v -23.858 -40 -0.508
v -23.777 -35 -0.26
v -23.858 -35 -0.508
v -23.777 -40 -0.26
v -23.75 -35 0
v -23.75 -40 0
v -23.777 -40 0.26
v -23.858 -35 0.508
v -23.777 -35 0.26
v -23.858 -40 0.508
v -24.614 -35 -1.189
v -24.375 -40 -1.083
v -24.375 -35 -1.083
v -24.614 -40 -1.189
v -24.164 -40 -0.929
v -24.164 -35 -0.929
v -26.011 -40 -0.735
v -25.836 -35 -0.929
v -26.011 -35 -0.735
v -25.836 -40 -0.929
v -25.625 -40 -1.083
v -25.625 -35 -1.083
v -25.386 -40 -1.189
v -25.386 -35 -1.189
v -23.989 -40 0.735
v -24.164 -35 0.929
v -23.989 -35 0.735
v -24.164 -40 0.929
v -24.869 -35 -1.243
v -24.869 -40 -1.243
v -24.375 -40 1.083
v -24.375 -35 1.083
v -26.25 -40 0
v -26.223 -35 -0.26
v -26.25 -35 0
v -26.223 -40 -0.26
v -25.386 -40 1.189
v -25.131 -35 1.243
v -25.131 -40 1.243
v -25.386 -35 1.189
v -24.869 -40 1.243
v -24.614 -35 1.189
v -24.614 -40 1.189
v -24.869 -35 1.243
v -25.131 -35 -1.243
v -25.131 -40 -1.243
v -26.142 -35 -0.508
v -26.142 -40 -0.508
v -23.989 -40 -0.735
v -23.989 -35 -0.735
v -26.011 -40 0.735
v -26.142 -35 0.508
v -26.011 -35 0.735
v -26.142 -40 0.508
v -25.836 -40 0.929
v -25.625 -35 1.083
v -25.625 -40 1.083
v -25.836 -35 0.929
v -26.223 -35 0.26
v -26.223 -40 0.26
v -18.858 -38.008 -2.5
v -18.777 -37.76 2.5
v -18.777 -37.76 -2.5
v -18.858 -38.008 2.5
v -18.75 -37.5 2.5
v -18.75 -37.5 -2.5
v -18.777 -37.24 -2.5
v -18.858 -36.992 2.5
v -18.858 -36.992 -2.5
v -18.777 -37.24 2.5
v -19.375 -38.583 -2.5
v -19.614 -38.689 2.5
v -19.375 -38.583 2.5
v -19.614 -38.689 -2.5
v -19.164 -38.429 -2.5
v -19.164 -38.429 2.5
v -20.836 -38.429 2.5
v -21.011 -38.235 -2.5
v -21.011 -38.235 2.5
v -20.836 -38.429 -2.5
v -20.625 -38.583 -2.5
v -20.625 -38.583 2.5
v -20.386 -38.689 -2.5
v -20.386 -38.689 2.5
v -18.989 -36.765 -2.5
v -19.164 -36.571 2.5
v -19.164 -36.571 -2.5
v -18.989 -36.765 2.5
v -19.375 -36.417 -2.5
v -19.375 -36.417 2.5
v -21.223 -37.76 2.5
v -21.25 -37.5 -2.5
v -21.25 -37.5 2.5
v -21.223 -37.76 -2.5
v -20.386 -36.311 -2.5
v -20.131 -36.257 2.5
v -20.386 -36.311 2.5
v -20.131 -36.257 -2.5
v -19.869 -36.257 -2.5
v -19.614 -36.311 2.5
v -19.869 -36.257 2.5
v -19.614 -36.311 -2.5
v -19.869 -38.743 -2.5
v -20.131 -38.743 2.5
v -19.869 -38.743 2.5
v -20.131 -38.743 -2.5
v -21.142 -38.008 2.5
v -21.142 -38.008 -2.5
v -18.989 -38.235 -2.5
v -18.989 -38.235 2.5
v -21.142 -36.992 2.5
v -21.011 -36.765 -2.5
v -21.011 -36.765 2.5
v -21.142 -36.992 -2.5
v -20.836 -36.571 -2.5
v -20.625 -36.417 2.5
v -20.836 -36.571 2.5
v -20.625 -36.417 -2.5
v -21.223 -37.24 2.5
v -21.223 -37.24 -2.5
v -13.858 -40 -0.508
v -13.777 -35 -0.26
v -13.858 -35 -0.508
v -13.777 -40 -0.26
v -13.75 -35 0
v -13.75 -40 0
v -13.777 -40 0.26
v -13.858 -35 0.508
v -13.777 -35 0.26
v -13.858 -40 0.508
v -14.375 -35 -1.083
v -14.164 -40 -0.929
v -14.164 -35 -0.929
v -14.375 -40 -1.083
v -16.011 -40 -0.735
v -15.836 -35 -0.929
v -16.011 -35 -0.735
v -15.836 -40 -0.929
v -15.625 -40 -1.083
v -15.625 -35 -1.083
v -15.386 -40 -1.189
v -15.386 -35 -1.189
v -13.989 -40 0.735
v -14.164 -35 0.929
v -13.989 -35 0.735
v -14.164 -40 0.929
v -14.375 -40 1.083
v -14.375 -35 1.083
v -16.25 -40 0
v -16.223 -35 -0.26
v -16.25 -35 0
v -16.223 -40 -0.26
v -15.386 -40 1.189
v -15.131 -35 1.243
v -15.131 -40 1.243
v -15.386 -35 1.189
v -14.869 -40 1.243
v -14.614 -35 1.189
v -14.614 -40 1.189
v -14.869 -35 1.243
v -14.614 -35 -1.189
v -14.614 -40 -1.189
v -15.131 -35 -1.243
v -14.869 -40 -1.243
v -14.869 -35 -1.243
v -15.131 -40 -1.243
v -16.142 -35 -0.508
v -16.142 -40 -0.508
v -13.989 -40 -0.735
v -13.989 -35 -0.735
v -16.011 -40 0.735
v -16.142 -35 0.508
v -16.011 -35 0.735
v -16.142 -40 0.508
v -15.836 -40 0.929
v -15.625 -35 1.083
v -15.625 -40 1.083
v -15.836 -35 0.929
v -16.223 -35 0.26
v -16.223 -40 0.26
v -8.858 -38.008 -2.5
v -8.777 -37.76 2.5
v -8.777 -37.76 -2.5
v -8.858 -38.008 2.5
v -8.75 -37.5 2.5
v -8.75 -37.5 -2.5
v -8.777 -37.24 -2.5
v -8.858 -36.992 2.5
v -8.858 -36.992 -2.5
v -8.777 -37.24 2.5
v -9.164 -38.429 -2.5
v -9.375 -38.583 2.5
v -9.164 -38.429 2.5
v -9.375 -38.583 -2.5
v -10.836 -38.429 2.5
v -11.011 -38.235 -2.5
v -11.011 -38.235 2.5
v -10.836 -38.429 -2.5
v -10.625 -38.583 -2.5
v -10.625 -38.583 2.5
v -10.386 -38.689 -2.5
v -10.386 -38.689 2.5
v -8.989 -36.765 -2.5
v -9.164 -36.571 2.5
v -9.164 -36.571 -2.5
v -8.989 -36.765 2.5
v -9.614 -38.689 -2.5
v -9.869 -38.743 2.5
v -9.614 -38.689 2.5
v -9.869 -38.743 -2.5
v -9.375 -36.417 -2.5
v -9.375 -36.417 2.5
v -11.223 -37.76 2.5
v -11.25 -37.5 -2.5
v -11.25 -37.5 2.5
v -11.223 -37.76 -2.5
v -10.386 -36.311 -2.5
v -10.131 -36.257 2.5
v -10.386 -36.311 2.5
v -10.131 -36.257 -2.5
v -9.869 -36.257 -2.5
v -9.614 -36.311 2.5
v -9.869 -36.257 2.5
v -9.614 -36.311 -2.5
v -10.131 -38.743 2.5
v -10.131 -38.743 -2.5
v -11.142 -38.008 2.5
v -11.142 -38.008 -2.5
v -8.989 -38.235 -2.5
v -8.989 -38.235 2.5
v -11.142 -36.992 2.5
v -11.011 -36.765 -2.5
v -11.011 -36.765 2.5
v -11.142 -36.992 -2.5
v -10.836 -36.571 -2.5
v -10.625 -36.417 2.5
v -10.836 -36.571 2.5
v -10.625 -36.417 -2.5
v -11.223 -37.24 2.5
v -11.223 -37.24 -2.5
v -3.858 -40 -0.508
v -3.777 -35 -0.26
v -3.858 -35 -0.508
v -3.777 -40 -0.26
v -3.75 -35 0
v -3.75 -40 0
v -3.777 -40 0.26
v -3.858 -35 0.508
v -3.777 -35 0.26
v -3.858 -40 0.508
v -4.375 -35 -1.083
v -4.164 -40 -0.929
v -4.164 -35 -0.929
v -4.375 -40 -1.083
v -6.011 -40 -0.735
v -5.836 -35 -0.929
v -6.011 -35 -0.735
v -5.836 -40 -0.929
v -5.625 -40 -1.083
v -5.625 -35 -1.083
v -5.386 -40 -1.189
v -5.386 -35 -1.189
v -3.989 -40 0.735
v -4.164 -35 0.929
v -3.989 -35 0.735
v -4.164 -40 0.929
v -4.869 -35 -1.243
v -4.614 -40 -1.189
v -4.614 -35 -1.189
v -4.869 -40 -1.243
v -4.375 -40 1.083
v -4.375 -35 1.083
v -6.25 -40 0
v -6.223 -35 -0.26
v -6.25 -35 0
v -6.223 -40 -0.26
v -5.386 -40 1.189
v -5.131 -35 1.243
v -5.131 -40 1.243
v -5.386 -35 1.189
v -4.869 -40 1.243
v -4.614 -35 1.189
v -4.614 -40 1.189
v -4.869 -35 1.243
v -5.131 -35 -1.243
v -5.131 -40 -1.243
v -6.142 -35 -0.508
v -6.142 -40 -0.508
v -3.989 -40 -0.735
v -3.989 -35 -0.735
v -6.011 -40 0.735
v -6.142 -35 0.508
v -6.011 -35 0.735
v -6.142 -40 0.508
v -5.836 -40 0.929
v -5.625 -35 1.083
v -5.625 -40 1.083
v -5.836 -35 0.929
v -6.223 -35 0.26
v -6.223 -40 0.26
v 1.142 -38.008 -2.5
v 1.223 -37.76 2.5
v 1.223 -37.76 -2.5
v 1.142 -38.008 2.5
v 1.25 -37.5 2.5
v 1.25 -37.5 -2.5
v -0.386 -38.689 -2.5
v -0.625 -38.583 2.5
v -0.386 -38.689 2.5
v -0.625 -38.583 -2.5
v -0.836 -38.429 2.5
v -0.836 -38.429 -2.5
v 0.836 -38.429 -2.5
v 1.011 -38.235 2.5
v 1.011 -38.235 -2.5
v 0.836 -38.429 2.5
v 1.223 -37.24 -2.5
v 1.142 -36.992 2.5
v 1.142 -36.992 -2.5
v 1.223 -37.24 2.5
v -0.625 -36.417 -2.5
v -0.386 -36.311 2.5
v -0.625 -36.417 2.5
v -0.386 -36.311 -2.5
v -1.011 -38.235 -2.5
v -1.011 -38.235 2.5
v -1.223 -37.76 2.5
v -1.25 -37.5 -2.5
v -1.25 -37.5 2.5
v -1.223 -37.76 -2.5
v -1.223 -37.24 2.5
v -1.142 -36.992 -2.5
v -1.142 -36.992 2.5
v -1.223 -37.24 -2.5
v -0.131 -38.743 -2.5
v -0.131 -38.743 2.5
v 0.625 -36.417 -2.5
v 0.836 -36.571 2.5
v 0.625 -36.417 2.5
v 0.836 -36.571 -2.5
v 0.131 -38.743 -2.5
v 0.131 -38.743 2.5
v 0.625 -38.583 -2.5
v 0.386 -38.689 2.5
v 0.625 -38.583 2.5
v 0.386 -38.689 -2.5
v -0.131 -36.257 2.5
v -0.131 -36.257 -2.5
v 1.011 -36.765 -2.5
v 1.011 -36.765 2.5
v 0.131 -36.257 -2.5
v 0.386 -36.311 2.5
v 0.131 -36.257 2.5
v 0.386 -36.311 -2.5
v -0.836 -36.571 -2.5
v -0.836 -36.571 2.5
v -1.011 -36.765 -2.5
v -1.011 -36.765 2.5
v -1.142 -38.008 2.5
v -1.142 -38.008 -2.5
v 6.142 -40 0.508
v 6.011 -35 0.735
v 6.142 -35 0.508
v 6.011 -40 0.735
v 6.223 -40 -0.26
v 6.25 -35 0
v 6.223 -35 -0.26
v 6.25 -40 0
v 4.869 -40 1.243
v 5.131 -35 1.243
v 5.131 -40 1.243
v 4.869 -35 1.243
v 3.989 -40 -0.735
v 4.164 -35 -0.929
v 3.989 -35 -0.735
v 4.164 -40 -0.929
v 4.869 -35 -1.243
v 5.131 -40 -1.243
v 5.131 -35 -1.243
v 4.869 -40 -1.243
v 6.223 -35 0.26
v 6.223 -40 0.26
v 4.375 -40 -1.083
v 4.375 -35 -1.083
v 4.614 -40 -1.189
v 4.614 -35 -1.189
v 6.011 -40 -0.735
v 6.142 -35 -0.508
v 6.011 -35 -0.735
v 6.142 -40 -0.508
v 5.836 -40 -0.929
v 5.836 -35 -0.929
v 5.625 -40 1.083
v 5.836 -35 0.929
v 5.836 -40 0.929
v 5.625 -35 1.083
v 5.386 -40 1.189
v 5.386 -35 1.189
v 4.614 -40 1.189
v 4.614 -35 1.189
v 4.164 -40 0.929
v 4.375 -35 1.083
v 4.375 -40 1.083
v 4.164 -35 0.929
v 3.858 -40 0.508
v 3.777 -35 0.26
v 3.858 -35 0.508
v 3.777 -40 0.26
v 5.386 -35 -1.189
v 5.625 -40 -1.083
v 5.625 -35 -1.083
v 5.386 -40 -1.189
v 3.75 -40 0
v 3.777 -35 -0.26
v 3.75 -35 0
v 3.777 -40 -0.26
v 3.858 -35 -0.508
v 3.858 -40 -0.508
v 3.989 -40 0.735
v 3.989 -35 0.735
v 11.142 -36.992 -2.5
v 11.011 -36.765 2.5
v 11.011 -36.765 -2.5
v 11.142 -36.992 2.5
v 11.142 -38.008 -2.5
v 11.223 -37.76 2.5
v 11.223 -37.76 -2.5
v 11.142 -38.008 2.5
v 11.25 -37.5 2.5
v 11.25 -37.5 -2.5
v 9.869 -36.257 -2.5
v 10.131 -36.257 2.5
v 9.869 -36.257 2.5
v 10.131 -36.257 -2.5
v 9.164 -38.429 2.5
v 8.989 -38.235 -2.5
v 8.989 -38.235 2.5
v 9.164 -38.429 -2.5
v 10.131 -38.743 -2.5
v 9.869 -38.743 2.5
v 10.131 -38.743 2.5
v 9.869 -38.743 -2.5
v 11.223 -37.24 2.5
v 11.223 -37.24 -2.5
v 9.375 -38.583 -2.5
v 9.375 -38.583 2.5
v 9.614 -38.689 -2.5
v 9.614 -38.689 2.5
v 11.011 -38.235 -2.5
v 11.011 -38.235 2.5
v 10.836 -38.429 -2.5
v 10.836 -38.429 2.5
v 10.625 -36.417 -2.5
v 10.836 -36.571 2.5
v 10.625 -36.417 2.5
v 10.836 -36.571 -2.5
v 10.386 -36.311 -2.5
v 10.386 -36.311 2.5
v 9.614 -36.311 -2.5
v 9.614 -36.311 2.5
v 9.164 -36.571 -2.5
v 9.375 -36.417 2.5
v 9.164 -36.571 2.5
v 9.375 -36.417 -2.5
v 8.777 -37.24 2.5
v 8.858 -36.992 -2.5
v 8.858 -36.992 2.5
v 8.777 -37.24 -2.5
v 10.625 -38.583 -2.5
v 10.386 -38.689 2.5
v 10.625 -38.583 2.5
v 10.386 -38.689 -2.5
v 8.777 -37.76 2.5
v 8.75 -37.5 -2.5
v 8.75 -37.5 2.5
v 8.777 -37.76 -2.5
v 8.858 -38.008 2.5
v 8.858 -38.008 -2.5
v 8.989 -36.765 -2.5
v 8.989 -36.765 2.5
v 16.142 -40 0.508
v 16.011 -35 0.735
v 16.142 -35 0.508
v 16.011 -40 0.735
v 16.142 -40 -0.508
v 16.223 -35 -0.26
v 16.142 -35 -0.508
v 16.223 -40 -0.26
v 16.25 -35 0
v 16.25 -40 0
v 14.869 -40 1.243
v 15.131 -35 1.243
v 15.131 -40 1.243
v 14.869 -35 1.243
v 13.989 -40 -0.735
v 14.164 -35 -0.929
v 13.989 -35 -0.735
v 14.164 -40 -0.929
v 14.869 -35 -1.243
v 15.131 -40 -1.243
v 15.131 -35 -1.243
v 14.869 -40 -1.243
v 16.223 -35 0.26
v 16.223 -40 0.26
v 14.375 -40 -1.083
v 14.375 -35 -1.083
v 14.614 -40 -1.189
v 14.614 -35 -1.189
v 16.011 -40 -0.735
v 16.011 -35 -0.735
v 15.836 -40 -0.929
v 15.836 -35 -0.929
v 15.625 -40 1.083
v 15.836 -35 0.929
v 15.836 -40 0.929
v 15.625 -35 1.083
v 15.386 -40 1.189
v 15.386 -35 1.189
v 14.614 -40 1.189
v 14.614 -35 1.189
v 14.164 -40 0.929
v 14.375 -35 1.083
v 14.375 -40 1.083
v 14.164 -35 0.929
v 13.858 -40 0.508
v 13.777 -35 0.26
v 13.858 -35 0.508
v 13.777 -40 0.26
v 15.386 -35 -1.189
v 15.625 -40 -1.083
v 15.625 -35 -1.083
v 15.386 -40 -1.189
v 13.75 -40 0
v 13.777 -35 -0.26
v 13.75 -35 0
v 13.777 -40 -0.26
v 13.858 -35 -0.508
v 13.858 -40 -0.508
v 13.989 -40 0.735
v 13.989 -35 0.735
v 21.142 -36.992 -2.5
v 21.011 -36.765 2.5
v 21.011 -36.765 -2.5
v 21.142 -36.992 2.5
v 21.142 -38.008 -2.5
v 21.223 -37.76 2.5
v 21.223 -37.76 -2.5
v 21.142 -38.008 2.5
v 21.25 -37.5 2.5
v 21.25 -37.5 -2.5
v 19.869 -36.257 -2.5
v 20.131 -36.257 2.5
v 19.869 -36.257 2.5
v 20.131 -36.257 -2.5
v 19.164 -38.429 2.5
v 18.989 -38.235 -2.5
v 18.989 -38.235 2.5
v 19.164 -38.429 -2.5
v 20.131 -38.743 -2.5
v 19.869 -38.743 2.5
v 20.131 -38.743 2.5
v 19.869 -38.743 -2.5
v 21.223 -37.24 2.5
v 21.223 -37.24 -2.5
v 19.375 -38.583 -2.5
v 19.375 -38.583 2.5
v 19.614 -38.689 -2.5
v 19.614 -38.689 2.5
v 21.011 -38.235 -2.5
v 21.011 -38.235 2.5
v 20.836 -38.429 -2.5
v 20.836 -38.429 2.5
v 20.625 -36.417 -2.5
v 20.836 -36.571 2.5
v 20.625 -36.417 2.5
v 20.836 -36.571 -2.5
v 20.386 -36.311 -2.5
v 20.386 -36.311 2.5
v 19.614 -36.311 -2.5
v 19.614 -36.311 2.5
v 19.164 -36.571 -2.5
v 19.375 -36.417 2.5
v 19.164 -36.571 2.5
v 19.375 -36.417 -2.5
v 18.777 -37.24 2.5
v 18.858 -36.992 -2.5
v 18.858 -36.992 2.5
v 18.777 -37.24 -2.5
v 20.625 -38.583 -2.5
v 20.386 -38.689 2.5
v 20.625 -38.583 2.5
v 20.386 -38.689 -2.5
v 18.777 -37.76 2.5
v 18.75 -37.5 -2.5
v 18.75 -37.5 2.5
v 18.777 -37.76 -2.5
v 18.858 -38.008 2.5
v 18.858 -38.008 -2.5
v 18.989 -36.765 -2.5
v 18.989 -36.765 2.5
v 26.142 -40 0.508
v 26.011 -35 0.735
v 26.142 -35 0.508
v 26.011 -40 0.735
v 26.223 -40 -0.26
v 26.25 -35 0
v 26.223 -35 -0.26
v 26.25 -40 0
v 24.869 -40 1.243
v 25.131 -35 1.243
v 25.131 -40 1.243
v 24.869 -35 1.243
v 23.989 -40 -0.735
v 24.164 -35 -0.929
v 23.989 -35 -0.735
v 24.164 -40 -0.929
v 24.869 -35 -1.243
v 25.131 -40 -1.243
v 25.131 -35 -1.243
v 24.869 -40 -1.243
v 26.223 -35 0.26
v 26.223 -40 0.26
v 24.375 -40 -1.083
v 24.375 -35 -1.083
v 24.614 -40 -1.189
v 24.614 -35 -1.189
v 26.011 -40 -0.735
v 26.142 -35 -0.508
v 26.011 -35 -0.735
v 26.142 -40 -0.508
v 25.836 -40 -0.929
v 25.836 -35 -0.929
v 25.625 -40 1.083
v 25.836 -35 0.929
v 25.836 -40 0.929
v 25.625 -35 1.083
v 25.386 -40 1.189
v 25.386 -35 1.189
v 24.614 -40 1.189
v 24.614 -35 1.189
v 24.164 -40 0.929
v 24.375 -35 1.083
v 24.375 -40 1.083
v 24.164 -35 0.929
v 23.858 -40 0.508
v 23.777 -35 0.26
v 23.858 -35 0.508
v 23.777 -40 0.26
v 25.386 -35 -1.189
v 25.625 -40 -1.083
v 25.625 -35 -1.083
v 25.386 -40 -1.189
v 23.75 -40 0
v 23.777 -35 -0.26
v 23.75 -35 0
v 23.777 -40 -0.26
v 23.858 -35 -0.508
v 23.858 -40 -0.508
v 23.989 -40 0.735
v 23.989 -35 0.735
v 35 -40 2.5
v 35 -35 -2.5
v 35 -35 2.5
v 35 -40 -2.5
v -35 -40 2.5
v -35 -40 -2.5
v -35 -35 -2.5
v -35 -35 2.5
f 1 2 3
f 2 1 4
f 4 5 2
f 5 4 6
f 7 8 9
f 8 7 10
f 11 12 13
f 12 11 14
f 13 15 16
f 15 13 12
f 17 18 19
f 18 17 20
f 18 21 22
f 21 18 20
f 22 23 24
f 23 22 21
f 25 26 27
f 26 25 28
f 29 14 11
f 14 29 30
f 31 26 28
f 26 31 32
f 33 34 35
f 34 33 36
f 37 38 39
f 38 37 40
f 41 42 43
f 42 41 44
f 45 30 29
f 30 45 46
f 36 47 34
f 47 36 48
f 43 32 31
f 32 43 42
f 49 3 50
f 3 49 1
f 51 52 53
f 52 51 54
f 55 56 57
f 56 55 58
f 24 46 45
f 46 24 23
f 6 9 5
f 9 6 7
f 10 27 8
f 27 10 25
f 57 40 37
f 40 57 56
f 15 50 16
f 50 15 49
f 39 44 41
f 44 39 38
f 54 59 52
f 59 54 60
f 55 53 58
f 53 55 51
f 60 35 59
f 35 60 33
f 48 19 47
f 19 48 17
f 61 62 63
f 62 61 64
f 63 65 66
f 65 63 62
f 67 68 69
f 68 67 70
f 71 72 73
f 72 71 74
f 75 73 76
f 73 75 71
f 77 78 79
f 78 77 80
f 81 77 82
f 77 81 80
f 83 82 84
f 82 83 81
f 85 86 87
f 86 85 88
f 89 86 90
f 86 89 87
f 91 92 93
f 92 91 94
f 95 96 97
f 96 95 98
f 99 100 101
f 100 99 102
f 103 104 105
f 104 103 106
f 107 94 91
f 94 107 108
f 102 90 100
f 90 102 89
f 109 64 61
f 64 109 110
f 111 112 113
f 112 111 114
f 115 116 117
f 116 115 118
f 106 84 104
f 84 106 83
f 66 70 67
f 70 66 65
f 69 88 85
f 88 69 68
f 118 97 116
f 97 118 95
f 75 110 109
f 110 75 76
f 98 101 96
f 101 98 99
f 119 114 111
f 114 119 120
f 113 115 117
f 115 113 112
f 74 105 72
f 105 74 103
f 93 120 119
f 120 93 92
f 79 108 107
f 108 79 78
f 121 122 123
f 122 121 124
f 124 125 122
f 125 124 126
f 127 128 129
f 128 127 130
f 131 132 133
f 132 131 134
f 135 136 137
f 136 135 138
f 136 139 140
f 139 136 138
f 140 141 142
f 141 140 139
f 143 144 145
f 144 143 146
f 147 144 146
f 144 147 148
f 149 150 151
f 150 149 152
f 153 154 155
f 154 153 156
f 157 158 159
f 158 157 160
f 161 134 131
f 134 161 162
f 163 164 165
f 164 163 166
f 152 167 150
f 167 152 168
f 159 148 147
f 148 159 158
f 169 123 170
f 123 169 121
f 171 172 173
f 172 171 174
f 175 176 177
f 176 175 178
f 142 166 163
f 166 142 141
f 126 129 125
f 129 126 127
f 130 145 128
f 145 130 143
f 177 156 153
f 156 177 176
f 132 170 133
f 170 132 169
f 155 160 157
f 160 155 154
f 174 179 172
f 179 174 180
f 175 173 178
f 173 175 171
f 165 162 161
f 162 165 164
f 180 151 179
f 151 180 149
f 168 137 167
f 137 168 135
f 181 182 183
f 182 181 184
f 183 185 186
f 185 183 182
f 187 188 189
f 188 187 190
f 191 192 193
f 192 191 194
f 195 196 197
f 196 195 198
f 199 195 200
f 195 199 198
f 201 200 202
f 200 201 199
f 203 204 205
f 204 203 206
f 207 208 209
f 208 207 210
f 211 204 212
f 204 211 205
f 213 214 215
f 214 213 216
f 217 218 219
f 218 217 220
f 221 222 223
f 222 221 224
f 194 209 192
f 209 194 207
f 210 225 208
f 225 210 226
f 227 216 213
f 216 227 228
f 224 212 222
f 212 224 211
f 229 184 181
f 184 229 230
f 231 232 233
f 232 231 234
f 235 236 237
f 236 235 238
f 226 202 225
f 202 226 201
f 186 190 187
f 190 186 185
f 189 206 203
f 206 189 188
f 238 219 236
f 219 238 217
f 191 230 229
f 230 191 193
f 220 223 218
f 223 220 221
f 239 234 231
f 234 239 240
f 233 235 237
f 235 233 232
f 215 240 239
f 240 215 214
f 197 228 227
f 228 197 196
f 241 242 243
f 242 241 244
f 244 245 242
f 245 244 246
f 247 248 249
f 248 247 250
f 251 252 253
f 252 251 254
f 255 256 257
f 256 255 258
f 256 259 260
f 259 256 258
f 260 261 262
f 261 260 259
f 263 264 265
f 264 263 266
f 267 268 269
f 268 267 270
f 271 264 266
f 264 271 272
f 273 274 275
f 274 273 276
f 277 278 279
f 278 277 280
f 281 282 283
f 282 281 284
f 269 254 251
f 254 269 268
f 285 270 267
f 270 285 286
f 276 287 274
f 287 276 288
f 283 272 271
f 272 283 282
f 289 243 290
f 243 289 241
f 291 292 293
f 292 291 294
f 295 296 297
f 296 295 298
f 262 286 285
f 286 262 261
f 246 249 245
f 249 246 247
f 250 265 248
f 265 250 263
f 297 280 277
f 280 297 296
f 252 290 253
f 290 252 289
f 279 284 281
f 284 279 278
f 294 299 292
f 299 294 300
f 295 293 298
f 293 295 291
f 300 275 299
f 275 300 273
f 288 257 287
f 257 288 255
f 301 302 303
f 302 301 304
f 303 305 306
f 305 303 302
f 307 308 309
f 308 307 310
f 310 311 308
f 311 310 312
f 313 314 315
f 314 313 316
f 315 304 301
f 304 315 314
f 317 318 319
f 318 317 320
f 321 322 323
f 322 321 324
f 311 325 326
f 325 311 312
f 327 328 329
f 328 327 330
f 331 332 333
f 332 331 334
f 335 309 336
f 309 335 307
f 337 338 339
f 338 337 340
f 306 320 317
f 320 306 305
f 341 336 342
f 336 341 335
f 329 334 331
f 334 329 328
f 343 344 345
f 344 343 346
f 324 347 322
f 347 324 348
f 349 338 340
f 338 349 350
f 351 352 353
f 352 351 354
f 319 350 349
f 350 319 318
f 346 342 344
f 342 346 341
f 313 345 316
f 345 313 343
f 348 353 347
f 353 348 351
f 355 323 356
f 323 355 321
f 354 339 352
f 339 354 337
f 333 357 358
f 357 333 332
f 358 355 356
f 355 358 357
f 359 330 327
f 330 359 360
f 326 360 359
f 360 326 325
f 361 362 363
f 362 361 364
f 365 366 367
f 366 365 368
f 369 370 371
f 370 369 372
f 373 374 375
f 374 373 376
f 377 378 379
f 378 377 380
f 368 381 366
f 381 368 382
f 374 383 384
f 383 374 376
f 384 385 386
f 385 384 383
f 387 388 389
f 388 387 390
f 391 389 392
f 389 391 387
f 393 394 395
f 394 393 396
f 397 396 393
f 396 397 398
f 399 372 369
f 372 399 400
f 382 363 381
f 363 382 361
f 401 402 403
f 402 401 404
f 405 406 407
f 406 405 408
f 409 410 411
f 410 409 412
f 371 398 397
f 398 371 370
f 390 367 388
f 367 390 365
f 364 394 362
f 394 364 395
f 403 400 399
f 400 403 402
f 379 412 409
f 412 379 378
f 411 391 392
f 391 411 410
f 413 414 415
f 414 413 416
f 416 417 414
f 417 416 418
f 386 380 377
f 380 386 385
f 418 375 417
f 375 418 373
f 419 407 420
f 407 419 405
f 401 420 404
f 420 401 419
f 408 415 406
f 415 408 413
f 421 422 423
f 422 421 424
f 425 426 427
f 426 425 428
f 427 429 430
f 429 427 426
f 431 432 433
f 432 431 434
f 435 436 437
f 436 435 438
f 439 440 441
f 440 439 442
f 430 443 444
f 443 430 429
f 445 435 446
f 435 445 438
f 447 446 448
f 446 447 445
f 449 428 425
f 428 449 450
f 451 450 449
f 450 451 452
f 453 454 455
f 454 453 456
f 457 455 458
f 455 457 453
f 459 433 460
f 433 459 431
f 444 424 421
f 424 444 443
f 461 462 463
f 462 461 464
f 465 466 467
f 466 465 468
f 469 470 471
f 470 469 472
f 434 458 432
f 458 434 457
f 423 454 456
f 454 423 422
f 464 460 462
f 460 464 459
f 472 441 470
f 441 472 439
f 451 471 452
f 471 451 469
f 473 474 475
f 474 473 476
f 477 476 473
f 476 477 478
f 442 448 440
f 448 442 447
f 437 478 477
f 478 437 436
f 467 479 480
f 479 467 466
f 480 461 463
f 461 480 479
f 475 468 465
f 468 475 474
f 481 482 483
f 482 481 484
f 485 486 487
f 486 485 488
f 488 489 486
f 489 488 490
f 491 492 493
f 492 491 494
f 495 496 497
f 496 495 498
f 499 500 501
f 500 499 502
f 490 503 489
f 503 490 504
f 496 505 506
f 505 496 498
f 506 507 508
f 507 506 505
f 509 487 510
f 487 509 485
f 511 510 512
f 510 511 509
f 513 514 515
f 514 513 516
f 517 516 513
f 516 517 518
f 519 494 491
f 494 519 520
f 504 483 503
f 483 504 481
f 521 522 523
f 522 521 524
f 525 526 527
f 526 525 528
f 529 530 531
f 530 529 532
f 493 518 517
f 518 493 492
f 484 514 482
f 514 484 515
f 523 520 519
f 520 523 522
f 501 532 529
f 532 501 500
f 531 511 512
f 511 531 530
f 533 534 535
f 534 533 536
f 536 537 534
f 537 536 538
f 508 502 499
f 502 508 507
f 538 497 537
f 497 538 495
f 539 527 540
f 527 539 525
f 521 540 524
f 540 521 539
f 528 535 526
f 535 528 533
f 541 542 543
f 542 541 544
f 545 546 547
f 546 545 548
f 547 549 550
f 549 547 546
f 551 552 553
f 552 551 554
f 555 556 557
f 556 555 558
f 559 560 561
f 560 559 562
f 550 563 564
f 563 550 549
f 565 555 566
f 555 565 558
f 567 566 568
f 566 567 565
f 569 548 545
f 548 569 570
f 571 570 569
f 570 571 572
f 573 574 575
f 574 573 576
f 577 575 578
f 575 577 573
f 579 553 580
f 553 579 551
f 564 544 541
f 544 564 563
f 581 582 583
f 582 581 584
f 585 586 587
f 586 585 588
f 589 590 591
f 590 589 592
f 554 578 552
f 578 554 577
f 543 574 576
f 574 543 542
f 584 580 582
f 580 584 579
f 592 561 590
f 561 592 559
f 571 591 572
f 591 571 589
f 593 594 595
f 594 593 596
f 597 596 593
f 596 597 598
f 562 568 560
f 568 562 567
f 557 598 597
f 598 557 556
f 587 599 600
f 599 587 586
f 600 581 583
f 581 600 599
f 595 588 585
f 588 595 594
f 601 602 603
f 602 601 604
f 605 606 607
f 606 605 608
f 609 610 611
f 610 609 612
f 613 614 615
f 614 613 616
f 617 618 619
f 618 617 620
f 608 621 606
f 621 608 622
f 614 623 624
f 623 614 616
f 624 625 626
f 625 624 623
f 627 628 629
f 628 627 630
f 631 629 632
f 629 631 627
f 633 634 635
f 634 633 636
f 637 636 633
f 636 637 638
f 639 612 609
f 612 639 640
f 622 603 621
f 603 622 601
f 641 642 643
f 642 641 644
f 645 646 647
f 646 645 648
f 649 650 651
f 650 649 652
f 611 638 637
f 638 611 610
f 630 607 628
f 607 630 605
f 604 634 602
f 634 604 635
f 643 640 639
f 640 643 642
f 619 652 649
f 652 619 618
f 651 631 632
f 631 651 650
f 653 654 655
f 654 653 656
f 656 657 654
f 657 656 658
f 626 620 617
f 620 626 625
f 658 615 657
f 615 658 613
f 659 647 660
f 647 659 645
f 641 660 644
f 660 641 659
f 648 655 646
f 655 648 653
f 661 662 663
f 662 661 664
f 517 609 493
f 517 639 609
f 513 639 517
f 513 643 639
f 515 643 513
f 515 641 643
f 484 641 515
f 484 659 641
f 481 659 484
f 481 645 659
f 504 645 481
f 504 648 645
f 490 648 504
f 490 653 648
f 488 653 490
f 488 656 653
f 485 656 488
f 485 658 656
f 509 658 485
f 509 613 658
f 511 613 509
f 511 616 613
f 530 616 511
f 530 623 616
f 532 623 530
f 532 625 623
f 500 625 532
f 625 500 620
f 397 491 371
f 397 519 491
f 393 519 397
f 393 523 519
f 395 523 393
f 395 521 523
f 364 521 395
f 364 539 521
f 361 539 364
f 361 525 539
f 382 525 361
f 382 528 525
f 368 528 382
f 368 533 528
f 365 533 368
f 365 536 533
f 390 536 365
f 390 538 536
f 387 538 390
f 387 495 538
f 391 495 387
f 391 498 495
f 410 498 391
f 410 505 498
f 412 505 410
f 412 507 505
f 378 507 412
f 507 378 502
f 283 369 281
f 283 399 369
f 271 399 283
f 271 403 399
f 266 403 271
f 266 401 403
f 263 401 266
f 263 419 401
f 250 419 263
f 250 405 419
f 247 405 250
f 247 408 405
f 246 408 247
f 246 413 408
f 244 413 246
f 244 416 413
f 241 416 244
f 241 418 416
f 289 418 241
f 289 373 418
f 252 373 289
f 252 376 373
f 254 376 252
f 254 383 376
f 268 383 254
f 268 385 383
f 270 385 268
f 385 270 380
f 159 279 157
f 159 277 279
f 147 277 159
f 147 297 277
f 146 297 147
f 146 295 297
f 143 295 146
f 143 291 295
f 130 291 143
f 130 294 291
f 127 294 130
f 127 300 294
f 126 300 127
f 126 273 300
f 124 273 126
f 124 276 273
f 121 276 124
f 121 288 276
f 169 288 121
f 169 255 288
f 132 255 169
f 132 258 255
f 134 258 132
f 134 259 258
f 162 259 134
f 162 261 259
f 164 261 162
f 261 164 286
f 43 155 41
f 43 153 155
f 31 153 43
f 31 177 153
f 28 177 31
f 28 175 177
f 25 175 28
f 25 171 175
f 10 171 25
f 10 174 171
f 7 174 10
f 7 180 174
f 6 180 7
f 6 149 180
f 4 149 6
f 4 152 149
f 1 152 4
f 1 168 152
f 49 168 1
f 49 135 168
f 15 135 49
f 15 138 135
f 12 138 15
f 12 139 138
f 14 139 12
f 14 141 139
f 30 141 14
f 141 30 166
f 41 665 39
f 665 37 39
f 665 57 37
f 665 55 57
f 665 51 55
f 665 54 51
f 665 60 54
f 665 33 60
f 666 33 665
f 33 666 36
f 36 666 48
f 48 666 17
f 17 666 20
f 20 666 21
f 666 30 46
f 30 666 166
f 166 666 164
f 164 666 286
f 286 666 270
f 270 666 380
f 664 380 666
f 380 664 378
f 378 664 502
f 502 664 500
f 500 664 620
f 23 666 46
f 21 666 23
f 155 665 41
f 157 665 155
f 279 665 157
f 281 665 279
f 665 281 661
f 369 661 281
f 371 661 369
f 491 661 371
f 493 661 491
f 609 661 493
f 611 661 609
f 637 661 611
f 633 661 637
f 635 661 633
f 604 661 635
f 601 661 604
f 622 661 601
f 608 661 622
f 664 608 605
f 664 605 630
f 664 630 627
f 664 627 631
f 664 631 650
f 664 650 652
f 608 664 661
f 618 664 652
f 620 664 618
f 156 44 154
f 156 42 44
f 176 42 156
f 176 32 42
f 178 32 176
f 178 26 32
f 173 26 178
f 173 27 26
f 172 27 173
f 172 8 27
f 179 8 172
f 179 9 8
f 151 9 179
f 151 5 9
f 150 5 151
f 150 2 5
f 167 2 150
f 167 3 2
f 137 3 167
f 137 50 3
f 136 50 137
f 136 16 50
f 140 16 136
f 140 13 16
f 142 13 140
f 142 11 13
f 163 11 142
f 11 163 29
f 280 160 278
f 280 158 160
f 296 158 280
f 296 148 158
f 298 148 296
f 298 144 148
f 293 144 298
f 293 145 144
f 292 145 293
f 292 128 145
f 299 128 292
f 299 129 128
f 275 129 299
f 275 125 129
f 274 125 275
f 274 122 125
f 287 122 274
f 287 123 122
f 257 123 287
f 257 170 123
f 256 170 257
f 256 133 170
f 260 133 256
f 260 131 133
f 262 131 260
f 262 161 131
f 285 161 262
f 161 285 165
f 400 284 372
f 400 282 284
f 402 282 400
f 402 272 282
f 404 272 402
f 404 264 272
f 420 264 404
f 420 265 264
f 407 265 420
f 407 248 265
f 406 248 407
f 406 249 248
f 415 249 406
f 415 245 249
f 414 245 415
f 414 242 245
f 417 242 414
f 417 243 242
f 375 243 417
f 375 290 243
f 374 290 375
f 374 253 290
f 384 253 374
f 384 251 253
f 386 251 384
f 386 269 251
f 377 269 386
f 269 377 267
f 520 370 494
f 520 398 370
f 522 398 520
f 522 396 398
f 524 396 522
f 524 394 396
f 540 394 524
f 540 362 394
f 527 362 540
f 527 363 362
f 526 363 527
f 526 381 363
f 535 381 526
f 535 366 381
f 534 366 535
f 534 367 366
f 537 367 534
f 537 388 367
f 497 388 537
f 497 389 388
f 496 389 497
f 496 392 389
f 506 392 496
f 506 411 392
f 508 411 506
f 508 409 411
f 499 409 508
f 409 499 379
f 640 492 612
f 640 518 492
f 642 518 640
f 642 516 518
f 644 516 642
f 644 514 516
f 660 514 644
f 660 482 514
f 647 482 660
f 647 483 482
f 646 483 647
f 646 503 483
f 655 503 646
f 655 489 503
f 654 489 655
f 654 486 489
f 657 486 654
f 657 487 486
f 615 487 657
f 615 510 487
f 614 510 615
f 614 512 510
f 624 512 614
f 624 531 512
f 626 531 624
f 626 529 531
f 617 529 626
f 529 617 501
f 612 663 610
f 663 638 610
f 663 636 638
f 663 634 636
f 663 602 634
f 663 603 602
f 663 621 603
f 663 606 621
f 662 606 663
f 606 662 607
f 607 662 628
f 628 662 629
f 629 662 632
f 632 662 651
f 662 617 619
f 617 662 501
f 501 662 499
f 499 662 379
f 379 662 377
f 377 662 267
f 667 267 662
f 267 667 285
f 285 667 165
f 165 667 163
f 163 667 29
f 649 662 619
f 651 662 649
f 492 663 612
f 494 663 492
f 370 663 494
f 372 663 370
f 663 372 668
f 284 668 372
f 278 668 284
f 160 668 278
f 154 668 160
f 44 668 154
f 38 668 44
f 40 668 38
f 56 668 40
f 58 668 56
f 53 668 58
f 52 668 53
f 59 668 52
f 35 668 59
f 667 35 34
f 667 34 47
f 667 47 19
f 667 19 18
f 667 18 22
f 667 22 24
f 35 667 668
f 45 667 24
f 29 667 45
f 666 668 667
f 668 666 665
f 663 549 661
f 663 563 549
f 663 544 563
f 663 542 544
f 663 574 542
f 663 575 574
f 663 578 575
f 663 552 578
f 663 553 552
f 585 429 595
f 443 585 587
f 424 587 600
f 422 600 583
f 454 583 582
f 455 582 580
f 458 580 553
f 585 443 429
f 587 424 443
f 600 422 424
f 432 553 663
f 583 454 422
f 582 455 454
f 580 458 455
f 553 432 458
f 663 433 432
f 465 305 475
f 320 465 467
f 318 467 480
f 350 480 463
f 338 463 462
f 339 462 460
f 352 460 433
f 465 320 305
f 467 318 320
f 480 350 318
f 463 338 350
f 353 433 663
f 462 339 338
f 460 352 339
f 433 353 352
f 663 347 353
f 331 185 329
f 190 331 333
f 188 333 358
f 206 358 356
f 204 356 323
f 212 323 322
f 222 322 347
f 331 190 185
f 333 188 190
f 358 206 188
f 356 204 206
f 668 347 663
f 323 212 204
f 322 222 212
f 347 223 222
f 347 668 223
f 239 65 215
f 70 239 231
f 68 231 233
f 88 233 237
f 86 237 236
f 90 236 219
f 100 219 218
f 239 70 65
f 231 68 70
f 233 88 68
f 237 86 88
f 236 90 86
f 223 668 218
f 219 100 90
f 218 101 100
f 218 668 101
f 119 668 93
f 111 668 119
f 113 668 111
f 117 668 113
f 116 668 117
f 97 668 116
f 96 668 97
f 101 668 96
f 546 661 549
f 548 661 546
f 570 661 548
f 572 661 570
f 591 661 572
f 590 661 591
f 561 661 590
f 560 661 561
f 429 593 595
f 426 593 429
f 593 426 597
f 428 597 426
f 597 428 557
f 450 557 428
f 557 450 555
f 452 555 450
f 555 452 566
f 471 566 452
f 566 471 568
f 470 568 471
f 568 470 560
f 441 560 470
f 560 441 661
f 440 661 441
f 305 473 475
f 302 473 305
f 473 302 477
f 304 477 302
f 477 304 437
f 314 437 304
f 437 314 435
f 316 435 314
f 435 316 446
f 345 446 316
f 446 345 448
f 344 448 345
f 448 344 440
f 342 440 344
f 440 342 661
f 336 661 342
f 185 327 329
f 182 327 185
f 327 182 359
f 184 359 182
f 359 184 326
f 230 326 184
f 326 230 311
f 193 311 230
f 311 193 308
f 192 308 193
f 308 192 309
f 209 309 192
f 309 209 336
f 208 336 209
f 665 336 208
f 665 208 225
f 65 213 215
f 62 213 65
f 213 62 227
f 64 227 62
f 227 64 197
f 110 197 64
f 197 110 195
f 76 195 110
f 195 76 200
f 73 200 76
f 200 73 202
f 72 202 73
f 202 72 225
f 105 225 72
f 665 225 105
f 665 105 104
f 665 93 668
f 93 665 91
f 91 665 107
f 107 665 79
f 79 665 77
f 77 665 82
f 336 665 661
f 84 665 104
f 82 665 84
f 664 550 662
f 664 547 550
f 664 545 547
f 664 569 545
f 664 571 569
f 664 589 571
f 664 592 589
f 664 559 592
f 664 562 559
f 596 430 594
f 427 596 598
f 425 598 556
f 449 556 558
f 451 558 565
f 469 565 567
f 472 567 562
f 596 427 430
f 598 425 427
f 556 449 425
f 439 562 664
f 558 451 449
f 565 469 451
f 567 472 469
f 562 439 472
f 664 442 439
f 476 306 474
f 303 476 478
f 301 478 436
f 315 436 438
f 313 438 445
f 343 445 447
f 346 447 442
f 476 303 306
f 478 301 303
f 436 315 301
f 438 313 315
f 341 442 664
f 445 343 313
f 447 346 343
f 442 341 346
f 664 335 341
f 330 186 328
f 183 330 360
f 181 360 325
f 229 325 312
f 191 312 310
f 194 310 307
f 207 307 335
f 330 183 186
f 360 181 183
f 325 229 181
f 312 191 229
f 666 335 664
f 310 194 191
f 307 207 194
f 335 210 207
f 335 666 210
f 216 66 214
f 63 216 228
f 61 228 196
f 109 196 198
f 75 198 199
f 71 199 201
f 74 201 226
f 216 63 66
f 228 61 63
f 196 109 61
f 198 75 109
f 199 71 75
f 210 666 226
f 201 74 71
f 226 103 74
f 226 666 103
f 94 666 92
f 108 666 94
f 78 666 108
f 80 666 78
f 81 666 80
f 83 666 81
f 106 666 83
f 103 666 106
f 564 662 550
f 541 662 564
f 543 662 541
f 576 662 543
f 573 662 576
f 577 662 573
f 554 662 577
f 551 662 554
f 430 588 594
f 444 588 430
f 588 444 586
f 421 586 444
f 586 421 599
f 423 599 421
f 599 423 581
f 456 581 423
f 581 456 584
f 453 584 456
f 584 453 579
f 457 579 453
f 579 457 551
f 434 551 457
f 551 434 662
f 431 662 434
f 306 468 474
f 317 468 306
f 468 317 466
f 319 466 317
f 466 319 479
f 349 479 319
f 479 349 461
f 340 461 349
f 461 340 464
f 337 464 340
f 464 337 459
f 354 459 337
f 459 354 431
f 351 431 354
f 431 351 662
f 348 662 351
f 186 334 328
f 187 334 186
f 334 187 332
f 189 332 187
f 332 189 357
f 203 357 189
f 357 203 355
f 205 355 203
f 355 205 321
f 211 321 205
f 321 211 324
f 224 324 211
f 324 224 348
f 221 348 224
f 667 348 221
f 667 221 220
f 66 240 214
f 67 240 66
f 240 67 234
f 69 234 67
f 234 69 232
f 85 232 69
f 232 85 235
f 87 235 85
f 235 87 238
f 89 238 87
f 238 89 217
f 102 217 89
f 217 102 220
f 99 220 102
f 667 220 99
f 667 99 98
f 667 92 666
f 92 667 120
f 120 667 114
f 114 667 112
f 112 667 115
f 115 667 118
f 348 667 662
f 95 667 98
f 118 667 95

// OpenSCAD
// file: ../settings.scad
// Common settings used by all scad files.

// ALL UNITS IN MILLIMETERS (MM)!!!

$fn = 30;//low-res but fast to render
//$fn = 50;//higher-res but slow to render

pi = 3.1415926535897932384626433832795;

max_footprint = 150; // 15x15 cm

bottom_clearance = 10;
bottom_clearance = 25.4/2+10;
//bottom_clearance = 30;

shell_alpha = 0.215;
//shell_alpha = 1.0;

tolerance = 0.5;

// Flat countersunk M2.5mm x 0.45mm machine screw.
screw_thread_diameter = 2.5;//2.8;//2.75;//2.4?
screw_thread_length = 5;//?
screw_head_diameter = 4.75; // M2.5
//screw_head_diameter = 5.2; // M3
screw_head_height = 1.5;//2;

screw_thread_diameter2 = 2;

unit_thickness = 5;
u = unit_thickness;

shell_thickness = unit_thickness;

// Show flags.
show_platform = 0;
show_head = 1;
show_head_shell = 0;
show_head_electronics_bb = 0;
show_battery = 1;
show_foot_cube = 0;
show_torso = 0;
show_motor = 0;
show_motor_plates = 1;
show_motor_inner_plates = 1;
show_motor_outer_plates = 1;
show_wheel = 0;//obsolete
show_tracks = 1;//
show_track_wheels = 1;
show_caster = 0;
show_rpi = 1;
show_vertical_plates = 1;//
show_horizontal_plates = 1;//
show_caster_plates = 0;//obsolete?
show_camera = 1;
show_screen = 0;
show_edge_mount = 1;
show_sonar_mount = 1;
show_recharge_mount = 1;
show_conduit = 1;
show_torso_shell = 1;
show_recharge_dock = 0;
show_head_tilt_axis = 0;
show_rpi_camera_axis = 0;
show_laser_axis = 0;

head_vertical_angle_tilt = 0;
//head_vertical_angle_tilt = 30;//max
//head_vertical_angle_tilt = 10;

torso_height = 120+20;

base_plate_diameter = max_footprint-unit_thickness*2;
base_plate_frame = 0;

head_height = 50;
head_offset_z = max_footprint/2;
head_middle_cutout = 85;

rpi_with_four_hats_and_clearance = 76;

qrd1114_w = 6.10;
qrd1114_l = 4.39;
qrd1114_h = 4.65;

dock_radius = 10;
dock_gripper_border = 2;
dock_gripper_instep = 0.9;
dock_gripper_cutout_tapper = 50;
dock_receiver_height = 5;

// Patriod Fuel+ 9000 mAh
battery_length = 90;
battery_width = 57;
battery_height = 23;
battery_offset_z = 30;//4;

wheel_diameter = 50;
wheel_offset_x = 65;
wheel_offset_z = wheel_diameter/2;
wheel_axle_diameter = 5;

//caster_diameter = 19.05; // 0.75 inches
caster_diameter = 25.45; // 1 inches
//caster_diameter = 15.875; // 5/8 inches
caster_holder_diameter = 30;//31;
caster_offset_y = base_plate_diameter/2 - caster_holder_diameter/2;

arduino_offset_x = 0;
arduino_offset_y = 0;
arduino_offset_z = 67;
arduino_offset_x2 = 0;
arduino_offset_y2 = -20;
arduino_offset_z2 = torso_height+bottom_clearance;

horizontal_plate_width = unit_thickness*8*2 - unit_thickness*2;
horizontal_plate_depth = unit_thickness*8*2;

vertical_plate_width = horizontal_plate_depth;
vertical_plate_height = unit_thickness*8;
vertical_plate_offset_x = wheel_offset_x-22.5;
vertical_plate_offset_z = vertical_plate_height/2 + unit_thickness/2;

vertical_battery_plate_height = 100 - 15;

caster_plate_width = horizontal_plate_width + unit_thickness*2;
caster_plate_mount_length = unit_thickness*4;
caster_plate_width_minor = caster_holder_diameter;

motor_switch_length = 20;
motor_switch_thickness = 6.5;
motor_switch_height = 11;
motor_switch_height_leads = 23;
motor_switch_on_height =  13.3;
motor_switch_hole_diameter = 2.5;
motor_switch_hole_offset_z = 6.5;//this plus diameter/2 is hole center from switch top
motor_switch_hole_spacing = 7.1;// holes are diameter/2 from this

motor_length = 60;
motor_width = 25;
motor_collar_width = 7;
motor_collar_height = 2.5;
motor_axle_width = 4;
motor_axle_height = 9.5;
motor_offset_x = 10;
//motor_offset_y = motor_width/2+5;
motor_offset_y = unit_thickness*3.5;
motor_offset_z = vertical_plate_height/2 - unit_thickness/2;//4;//30;
motor_mount_holes_dist = 17;
// motor countersink hole
motor_mount_holes_width = 3; // M3
motor_mount_holes_head_height = 2.2;
motor_mount_holes_head_width = 5.8;
motor_bearing_outer_diameter = 10;
motor_bearing_inner_diameter = 5.95;
motor_bearing_thickness = 2.5;

motor_unimount_idler_axle_d = screw_thread_diameter;
//motor_unimount_spacer_depth = 0.1;//too small
motor_unimount_spacer_depth = 0.5;

motor_arm_offset_y = -u*3;
motor_arm_offset_z = u*.5;

motor_plate_width = vertical_plate_width;
motor_plate_height = vertical_plate_height;
motor_plate_thickness = unit_thickness;
motor_plate_offset_z = vertical_plate_offset_z;

motor_plate_middle_thickness = 5;

wheel_hub_offset = u*3;

motor_hole_height_offset = -5;

nylon_spacer_outer_diameter = 6.35;
nylon_spacer_inner_diameter = 3.302;
nylon_spacer_length = 12.7;

track_width = unit_thickness*3;
track_offset_x = -50;
track_offset_z = .1;
//track_wheel_radius = 19;//original
track_wheel_radius = 14;
//track_wheel_hole_radius = (nylon_spacer_outer_diameter+1)/2;
track_wheel_hole_radius = motor_bearing_outer_diameter/2;

track_driver_hole_radius = (motor_axle_width)/2 + 0.1;
track_driver_set_screw_head_d = 4.1;
track_driver_set_screw_shaft_d = 2.4;
//track_wheel_width = 13.5;//original
track_wheel_width = u*2;
track_wheel_width_buffer = u*0.25;
track_offset = 3;        //distance from chassis
track_wheel_offset = track_offset;
//track_length = 250; // see tread_triangle.py, too big
//track_length = 240; // see tread_triangle.py
//track_length = 238; //inc/dec in 10 unit increments so notches match idlers
track_length = 228; //inc/dec in 10 unit increments so notches match idlers
track_radius = track_length/2/pi;
track_wheel_show_fancy = 1;
track_wheel_gap = track_wheel_width + track_wheel_width_buffer*2;
track_axle_bearing_diameter = motor_bearing_inner_diameter - 0.1;
track_tensioner_radius = 12;
track_nut_height = 3.5; //TODO
track_punchout_thickness = 0.25;//should be the same as the minimum layer thickness

head_slew_bearing_outer_diameter = 115;
head_slew_bearing_ring_thickness = 20;
head_slew_bearing_inner_diameter = head_slew_bearing_outer_diameter - head_slew_bearing_ring_thickness;
//head_slew_bearing_hole_diameter = head_slew_bearing_inner_diameter - head_slew_bearing_ring_thickness;
head_slew_bearing_hole_diameter = 12+tolerance; // slip ring https://www.adafruit.com/products/775
//head_slew_bearing_ball_diameter = 5;
head_slew_bearing_ball_diameter = 2.5; //u/2;
head_slew_bearing_height = u;//head_slew_bearing_ball_diameter*2;
head_slew_bearing_gap = 0.5;
head_slew_bearing_slew_gap = 0;
head_slew_bearing_gap_factor = 0.1;

neck_strut_width = u*7;
neck_strut_height = u*18;
neck_strut_spacing = u*8;

show_outer_race = 0;
show_inner_race_a = 1;
show_inner_race_b = 1;
show_balls = 0;
// main file
include <../settings.scad>;
use <plate.scad>;

// This supports the frame horizontally.
module make_horizontal_support(cs_top=0){
    u = unit_thickness;
    width = horizontal_plate_width;
    depth = horizontal_plate_depth;
    d = screw_thread_diameter;

    union(){


    //make_generic_plate(u=u, a=width/u, b=depth/u, d=d, cross=1, border=0);
    
    translate([0,-(width/2+u/2),0])
    rotate([90,0,0])
    make_generic_beam(
        u=u,
        a=width/u,//actual width
        //b=width/u,//width used by holes
        d=d,
        end_fills=1.5,
        countersink_d=screw_head_diameter,
        countersink_d2=screw_thread_diameter,
        countersink_depth=screw_head_height,
        cx1=cs_top,
//holes=0,
        cx2=0,
        cy1=0,
        cy2=0
    );

//TODO:incomplete
    
    }
}

make_horizontal_support();
